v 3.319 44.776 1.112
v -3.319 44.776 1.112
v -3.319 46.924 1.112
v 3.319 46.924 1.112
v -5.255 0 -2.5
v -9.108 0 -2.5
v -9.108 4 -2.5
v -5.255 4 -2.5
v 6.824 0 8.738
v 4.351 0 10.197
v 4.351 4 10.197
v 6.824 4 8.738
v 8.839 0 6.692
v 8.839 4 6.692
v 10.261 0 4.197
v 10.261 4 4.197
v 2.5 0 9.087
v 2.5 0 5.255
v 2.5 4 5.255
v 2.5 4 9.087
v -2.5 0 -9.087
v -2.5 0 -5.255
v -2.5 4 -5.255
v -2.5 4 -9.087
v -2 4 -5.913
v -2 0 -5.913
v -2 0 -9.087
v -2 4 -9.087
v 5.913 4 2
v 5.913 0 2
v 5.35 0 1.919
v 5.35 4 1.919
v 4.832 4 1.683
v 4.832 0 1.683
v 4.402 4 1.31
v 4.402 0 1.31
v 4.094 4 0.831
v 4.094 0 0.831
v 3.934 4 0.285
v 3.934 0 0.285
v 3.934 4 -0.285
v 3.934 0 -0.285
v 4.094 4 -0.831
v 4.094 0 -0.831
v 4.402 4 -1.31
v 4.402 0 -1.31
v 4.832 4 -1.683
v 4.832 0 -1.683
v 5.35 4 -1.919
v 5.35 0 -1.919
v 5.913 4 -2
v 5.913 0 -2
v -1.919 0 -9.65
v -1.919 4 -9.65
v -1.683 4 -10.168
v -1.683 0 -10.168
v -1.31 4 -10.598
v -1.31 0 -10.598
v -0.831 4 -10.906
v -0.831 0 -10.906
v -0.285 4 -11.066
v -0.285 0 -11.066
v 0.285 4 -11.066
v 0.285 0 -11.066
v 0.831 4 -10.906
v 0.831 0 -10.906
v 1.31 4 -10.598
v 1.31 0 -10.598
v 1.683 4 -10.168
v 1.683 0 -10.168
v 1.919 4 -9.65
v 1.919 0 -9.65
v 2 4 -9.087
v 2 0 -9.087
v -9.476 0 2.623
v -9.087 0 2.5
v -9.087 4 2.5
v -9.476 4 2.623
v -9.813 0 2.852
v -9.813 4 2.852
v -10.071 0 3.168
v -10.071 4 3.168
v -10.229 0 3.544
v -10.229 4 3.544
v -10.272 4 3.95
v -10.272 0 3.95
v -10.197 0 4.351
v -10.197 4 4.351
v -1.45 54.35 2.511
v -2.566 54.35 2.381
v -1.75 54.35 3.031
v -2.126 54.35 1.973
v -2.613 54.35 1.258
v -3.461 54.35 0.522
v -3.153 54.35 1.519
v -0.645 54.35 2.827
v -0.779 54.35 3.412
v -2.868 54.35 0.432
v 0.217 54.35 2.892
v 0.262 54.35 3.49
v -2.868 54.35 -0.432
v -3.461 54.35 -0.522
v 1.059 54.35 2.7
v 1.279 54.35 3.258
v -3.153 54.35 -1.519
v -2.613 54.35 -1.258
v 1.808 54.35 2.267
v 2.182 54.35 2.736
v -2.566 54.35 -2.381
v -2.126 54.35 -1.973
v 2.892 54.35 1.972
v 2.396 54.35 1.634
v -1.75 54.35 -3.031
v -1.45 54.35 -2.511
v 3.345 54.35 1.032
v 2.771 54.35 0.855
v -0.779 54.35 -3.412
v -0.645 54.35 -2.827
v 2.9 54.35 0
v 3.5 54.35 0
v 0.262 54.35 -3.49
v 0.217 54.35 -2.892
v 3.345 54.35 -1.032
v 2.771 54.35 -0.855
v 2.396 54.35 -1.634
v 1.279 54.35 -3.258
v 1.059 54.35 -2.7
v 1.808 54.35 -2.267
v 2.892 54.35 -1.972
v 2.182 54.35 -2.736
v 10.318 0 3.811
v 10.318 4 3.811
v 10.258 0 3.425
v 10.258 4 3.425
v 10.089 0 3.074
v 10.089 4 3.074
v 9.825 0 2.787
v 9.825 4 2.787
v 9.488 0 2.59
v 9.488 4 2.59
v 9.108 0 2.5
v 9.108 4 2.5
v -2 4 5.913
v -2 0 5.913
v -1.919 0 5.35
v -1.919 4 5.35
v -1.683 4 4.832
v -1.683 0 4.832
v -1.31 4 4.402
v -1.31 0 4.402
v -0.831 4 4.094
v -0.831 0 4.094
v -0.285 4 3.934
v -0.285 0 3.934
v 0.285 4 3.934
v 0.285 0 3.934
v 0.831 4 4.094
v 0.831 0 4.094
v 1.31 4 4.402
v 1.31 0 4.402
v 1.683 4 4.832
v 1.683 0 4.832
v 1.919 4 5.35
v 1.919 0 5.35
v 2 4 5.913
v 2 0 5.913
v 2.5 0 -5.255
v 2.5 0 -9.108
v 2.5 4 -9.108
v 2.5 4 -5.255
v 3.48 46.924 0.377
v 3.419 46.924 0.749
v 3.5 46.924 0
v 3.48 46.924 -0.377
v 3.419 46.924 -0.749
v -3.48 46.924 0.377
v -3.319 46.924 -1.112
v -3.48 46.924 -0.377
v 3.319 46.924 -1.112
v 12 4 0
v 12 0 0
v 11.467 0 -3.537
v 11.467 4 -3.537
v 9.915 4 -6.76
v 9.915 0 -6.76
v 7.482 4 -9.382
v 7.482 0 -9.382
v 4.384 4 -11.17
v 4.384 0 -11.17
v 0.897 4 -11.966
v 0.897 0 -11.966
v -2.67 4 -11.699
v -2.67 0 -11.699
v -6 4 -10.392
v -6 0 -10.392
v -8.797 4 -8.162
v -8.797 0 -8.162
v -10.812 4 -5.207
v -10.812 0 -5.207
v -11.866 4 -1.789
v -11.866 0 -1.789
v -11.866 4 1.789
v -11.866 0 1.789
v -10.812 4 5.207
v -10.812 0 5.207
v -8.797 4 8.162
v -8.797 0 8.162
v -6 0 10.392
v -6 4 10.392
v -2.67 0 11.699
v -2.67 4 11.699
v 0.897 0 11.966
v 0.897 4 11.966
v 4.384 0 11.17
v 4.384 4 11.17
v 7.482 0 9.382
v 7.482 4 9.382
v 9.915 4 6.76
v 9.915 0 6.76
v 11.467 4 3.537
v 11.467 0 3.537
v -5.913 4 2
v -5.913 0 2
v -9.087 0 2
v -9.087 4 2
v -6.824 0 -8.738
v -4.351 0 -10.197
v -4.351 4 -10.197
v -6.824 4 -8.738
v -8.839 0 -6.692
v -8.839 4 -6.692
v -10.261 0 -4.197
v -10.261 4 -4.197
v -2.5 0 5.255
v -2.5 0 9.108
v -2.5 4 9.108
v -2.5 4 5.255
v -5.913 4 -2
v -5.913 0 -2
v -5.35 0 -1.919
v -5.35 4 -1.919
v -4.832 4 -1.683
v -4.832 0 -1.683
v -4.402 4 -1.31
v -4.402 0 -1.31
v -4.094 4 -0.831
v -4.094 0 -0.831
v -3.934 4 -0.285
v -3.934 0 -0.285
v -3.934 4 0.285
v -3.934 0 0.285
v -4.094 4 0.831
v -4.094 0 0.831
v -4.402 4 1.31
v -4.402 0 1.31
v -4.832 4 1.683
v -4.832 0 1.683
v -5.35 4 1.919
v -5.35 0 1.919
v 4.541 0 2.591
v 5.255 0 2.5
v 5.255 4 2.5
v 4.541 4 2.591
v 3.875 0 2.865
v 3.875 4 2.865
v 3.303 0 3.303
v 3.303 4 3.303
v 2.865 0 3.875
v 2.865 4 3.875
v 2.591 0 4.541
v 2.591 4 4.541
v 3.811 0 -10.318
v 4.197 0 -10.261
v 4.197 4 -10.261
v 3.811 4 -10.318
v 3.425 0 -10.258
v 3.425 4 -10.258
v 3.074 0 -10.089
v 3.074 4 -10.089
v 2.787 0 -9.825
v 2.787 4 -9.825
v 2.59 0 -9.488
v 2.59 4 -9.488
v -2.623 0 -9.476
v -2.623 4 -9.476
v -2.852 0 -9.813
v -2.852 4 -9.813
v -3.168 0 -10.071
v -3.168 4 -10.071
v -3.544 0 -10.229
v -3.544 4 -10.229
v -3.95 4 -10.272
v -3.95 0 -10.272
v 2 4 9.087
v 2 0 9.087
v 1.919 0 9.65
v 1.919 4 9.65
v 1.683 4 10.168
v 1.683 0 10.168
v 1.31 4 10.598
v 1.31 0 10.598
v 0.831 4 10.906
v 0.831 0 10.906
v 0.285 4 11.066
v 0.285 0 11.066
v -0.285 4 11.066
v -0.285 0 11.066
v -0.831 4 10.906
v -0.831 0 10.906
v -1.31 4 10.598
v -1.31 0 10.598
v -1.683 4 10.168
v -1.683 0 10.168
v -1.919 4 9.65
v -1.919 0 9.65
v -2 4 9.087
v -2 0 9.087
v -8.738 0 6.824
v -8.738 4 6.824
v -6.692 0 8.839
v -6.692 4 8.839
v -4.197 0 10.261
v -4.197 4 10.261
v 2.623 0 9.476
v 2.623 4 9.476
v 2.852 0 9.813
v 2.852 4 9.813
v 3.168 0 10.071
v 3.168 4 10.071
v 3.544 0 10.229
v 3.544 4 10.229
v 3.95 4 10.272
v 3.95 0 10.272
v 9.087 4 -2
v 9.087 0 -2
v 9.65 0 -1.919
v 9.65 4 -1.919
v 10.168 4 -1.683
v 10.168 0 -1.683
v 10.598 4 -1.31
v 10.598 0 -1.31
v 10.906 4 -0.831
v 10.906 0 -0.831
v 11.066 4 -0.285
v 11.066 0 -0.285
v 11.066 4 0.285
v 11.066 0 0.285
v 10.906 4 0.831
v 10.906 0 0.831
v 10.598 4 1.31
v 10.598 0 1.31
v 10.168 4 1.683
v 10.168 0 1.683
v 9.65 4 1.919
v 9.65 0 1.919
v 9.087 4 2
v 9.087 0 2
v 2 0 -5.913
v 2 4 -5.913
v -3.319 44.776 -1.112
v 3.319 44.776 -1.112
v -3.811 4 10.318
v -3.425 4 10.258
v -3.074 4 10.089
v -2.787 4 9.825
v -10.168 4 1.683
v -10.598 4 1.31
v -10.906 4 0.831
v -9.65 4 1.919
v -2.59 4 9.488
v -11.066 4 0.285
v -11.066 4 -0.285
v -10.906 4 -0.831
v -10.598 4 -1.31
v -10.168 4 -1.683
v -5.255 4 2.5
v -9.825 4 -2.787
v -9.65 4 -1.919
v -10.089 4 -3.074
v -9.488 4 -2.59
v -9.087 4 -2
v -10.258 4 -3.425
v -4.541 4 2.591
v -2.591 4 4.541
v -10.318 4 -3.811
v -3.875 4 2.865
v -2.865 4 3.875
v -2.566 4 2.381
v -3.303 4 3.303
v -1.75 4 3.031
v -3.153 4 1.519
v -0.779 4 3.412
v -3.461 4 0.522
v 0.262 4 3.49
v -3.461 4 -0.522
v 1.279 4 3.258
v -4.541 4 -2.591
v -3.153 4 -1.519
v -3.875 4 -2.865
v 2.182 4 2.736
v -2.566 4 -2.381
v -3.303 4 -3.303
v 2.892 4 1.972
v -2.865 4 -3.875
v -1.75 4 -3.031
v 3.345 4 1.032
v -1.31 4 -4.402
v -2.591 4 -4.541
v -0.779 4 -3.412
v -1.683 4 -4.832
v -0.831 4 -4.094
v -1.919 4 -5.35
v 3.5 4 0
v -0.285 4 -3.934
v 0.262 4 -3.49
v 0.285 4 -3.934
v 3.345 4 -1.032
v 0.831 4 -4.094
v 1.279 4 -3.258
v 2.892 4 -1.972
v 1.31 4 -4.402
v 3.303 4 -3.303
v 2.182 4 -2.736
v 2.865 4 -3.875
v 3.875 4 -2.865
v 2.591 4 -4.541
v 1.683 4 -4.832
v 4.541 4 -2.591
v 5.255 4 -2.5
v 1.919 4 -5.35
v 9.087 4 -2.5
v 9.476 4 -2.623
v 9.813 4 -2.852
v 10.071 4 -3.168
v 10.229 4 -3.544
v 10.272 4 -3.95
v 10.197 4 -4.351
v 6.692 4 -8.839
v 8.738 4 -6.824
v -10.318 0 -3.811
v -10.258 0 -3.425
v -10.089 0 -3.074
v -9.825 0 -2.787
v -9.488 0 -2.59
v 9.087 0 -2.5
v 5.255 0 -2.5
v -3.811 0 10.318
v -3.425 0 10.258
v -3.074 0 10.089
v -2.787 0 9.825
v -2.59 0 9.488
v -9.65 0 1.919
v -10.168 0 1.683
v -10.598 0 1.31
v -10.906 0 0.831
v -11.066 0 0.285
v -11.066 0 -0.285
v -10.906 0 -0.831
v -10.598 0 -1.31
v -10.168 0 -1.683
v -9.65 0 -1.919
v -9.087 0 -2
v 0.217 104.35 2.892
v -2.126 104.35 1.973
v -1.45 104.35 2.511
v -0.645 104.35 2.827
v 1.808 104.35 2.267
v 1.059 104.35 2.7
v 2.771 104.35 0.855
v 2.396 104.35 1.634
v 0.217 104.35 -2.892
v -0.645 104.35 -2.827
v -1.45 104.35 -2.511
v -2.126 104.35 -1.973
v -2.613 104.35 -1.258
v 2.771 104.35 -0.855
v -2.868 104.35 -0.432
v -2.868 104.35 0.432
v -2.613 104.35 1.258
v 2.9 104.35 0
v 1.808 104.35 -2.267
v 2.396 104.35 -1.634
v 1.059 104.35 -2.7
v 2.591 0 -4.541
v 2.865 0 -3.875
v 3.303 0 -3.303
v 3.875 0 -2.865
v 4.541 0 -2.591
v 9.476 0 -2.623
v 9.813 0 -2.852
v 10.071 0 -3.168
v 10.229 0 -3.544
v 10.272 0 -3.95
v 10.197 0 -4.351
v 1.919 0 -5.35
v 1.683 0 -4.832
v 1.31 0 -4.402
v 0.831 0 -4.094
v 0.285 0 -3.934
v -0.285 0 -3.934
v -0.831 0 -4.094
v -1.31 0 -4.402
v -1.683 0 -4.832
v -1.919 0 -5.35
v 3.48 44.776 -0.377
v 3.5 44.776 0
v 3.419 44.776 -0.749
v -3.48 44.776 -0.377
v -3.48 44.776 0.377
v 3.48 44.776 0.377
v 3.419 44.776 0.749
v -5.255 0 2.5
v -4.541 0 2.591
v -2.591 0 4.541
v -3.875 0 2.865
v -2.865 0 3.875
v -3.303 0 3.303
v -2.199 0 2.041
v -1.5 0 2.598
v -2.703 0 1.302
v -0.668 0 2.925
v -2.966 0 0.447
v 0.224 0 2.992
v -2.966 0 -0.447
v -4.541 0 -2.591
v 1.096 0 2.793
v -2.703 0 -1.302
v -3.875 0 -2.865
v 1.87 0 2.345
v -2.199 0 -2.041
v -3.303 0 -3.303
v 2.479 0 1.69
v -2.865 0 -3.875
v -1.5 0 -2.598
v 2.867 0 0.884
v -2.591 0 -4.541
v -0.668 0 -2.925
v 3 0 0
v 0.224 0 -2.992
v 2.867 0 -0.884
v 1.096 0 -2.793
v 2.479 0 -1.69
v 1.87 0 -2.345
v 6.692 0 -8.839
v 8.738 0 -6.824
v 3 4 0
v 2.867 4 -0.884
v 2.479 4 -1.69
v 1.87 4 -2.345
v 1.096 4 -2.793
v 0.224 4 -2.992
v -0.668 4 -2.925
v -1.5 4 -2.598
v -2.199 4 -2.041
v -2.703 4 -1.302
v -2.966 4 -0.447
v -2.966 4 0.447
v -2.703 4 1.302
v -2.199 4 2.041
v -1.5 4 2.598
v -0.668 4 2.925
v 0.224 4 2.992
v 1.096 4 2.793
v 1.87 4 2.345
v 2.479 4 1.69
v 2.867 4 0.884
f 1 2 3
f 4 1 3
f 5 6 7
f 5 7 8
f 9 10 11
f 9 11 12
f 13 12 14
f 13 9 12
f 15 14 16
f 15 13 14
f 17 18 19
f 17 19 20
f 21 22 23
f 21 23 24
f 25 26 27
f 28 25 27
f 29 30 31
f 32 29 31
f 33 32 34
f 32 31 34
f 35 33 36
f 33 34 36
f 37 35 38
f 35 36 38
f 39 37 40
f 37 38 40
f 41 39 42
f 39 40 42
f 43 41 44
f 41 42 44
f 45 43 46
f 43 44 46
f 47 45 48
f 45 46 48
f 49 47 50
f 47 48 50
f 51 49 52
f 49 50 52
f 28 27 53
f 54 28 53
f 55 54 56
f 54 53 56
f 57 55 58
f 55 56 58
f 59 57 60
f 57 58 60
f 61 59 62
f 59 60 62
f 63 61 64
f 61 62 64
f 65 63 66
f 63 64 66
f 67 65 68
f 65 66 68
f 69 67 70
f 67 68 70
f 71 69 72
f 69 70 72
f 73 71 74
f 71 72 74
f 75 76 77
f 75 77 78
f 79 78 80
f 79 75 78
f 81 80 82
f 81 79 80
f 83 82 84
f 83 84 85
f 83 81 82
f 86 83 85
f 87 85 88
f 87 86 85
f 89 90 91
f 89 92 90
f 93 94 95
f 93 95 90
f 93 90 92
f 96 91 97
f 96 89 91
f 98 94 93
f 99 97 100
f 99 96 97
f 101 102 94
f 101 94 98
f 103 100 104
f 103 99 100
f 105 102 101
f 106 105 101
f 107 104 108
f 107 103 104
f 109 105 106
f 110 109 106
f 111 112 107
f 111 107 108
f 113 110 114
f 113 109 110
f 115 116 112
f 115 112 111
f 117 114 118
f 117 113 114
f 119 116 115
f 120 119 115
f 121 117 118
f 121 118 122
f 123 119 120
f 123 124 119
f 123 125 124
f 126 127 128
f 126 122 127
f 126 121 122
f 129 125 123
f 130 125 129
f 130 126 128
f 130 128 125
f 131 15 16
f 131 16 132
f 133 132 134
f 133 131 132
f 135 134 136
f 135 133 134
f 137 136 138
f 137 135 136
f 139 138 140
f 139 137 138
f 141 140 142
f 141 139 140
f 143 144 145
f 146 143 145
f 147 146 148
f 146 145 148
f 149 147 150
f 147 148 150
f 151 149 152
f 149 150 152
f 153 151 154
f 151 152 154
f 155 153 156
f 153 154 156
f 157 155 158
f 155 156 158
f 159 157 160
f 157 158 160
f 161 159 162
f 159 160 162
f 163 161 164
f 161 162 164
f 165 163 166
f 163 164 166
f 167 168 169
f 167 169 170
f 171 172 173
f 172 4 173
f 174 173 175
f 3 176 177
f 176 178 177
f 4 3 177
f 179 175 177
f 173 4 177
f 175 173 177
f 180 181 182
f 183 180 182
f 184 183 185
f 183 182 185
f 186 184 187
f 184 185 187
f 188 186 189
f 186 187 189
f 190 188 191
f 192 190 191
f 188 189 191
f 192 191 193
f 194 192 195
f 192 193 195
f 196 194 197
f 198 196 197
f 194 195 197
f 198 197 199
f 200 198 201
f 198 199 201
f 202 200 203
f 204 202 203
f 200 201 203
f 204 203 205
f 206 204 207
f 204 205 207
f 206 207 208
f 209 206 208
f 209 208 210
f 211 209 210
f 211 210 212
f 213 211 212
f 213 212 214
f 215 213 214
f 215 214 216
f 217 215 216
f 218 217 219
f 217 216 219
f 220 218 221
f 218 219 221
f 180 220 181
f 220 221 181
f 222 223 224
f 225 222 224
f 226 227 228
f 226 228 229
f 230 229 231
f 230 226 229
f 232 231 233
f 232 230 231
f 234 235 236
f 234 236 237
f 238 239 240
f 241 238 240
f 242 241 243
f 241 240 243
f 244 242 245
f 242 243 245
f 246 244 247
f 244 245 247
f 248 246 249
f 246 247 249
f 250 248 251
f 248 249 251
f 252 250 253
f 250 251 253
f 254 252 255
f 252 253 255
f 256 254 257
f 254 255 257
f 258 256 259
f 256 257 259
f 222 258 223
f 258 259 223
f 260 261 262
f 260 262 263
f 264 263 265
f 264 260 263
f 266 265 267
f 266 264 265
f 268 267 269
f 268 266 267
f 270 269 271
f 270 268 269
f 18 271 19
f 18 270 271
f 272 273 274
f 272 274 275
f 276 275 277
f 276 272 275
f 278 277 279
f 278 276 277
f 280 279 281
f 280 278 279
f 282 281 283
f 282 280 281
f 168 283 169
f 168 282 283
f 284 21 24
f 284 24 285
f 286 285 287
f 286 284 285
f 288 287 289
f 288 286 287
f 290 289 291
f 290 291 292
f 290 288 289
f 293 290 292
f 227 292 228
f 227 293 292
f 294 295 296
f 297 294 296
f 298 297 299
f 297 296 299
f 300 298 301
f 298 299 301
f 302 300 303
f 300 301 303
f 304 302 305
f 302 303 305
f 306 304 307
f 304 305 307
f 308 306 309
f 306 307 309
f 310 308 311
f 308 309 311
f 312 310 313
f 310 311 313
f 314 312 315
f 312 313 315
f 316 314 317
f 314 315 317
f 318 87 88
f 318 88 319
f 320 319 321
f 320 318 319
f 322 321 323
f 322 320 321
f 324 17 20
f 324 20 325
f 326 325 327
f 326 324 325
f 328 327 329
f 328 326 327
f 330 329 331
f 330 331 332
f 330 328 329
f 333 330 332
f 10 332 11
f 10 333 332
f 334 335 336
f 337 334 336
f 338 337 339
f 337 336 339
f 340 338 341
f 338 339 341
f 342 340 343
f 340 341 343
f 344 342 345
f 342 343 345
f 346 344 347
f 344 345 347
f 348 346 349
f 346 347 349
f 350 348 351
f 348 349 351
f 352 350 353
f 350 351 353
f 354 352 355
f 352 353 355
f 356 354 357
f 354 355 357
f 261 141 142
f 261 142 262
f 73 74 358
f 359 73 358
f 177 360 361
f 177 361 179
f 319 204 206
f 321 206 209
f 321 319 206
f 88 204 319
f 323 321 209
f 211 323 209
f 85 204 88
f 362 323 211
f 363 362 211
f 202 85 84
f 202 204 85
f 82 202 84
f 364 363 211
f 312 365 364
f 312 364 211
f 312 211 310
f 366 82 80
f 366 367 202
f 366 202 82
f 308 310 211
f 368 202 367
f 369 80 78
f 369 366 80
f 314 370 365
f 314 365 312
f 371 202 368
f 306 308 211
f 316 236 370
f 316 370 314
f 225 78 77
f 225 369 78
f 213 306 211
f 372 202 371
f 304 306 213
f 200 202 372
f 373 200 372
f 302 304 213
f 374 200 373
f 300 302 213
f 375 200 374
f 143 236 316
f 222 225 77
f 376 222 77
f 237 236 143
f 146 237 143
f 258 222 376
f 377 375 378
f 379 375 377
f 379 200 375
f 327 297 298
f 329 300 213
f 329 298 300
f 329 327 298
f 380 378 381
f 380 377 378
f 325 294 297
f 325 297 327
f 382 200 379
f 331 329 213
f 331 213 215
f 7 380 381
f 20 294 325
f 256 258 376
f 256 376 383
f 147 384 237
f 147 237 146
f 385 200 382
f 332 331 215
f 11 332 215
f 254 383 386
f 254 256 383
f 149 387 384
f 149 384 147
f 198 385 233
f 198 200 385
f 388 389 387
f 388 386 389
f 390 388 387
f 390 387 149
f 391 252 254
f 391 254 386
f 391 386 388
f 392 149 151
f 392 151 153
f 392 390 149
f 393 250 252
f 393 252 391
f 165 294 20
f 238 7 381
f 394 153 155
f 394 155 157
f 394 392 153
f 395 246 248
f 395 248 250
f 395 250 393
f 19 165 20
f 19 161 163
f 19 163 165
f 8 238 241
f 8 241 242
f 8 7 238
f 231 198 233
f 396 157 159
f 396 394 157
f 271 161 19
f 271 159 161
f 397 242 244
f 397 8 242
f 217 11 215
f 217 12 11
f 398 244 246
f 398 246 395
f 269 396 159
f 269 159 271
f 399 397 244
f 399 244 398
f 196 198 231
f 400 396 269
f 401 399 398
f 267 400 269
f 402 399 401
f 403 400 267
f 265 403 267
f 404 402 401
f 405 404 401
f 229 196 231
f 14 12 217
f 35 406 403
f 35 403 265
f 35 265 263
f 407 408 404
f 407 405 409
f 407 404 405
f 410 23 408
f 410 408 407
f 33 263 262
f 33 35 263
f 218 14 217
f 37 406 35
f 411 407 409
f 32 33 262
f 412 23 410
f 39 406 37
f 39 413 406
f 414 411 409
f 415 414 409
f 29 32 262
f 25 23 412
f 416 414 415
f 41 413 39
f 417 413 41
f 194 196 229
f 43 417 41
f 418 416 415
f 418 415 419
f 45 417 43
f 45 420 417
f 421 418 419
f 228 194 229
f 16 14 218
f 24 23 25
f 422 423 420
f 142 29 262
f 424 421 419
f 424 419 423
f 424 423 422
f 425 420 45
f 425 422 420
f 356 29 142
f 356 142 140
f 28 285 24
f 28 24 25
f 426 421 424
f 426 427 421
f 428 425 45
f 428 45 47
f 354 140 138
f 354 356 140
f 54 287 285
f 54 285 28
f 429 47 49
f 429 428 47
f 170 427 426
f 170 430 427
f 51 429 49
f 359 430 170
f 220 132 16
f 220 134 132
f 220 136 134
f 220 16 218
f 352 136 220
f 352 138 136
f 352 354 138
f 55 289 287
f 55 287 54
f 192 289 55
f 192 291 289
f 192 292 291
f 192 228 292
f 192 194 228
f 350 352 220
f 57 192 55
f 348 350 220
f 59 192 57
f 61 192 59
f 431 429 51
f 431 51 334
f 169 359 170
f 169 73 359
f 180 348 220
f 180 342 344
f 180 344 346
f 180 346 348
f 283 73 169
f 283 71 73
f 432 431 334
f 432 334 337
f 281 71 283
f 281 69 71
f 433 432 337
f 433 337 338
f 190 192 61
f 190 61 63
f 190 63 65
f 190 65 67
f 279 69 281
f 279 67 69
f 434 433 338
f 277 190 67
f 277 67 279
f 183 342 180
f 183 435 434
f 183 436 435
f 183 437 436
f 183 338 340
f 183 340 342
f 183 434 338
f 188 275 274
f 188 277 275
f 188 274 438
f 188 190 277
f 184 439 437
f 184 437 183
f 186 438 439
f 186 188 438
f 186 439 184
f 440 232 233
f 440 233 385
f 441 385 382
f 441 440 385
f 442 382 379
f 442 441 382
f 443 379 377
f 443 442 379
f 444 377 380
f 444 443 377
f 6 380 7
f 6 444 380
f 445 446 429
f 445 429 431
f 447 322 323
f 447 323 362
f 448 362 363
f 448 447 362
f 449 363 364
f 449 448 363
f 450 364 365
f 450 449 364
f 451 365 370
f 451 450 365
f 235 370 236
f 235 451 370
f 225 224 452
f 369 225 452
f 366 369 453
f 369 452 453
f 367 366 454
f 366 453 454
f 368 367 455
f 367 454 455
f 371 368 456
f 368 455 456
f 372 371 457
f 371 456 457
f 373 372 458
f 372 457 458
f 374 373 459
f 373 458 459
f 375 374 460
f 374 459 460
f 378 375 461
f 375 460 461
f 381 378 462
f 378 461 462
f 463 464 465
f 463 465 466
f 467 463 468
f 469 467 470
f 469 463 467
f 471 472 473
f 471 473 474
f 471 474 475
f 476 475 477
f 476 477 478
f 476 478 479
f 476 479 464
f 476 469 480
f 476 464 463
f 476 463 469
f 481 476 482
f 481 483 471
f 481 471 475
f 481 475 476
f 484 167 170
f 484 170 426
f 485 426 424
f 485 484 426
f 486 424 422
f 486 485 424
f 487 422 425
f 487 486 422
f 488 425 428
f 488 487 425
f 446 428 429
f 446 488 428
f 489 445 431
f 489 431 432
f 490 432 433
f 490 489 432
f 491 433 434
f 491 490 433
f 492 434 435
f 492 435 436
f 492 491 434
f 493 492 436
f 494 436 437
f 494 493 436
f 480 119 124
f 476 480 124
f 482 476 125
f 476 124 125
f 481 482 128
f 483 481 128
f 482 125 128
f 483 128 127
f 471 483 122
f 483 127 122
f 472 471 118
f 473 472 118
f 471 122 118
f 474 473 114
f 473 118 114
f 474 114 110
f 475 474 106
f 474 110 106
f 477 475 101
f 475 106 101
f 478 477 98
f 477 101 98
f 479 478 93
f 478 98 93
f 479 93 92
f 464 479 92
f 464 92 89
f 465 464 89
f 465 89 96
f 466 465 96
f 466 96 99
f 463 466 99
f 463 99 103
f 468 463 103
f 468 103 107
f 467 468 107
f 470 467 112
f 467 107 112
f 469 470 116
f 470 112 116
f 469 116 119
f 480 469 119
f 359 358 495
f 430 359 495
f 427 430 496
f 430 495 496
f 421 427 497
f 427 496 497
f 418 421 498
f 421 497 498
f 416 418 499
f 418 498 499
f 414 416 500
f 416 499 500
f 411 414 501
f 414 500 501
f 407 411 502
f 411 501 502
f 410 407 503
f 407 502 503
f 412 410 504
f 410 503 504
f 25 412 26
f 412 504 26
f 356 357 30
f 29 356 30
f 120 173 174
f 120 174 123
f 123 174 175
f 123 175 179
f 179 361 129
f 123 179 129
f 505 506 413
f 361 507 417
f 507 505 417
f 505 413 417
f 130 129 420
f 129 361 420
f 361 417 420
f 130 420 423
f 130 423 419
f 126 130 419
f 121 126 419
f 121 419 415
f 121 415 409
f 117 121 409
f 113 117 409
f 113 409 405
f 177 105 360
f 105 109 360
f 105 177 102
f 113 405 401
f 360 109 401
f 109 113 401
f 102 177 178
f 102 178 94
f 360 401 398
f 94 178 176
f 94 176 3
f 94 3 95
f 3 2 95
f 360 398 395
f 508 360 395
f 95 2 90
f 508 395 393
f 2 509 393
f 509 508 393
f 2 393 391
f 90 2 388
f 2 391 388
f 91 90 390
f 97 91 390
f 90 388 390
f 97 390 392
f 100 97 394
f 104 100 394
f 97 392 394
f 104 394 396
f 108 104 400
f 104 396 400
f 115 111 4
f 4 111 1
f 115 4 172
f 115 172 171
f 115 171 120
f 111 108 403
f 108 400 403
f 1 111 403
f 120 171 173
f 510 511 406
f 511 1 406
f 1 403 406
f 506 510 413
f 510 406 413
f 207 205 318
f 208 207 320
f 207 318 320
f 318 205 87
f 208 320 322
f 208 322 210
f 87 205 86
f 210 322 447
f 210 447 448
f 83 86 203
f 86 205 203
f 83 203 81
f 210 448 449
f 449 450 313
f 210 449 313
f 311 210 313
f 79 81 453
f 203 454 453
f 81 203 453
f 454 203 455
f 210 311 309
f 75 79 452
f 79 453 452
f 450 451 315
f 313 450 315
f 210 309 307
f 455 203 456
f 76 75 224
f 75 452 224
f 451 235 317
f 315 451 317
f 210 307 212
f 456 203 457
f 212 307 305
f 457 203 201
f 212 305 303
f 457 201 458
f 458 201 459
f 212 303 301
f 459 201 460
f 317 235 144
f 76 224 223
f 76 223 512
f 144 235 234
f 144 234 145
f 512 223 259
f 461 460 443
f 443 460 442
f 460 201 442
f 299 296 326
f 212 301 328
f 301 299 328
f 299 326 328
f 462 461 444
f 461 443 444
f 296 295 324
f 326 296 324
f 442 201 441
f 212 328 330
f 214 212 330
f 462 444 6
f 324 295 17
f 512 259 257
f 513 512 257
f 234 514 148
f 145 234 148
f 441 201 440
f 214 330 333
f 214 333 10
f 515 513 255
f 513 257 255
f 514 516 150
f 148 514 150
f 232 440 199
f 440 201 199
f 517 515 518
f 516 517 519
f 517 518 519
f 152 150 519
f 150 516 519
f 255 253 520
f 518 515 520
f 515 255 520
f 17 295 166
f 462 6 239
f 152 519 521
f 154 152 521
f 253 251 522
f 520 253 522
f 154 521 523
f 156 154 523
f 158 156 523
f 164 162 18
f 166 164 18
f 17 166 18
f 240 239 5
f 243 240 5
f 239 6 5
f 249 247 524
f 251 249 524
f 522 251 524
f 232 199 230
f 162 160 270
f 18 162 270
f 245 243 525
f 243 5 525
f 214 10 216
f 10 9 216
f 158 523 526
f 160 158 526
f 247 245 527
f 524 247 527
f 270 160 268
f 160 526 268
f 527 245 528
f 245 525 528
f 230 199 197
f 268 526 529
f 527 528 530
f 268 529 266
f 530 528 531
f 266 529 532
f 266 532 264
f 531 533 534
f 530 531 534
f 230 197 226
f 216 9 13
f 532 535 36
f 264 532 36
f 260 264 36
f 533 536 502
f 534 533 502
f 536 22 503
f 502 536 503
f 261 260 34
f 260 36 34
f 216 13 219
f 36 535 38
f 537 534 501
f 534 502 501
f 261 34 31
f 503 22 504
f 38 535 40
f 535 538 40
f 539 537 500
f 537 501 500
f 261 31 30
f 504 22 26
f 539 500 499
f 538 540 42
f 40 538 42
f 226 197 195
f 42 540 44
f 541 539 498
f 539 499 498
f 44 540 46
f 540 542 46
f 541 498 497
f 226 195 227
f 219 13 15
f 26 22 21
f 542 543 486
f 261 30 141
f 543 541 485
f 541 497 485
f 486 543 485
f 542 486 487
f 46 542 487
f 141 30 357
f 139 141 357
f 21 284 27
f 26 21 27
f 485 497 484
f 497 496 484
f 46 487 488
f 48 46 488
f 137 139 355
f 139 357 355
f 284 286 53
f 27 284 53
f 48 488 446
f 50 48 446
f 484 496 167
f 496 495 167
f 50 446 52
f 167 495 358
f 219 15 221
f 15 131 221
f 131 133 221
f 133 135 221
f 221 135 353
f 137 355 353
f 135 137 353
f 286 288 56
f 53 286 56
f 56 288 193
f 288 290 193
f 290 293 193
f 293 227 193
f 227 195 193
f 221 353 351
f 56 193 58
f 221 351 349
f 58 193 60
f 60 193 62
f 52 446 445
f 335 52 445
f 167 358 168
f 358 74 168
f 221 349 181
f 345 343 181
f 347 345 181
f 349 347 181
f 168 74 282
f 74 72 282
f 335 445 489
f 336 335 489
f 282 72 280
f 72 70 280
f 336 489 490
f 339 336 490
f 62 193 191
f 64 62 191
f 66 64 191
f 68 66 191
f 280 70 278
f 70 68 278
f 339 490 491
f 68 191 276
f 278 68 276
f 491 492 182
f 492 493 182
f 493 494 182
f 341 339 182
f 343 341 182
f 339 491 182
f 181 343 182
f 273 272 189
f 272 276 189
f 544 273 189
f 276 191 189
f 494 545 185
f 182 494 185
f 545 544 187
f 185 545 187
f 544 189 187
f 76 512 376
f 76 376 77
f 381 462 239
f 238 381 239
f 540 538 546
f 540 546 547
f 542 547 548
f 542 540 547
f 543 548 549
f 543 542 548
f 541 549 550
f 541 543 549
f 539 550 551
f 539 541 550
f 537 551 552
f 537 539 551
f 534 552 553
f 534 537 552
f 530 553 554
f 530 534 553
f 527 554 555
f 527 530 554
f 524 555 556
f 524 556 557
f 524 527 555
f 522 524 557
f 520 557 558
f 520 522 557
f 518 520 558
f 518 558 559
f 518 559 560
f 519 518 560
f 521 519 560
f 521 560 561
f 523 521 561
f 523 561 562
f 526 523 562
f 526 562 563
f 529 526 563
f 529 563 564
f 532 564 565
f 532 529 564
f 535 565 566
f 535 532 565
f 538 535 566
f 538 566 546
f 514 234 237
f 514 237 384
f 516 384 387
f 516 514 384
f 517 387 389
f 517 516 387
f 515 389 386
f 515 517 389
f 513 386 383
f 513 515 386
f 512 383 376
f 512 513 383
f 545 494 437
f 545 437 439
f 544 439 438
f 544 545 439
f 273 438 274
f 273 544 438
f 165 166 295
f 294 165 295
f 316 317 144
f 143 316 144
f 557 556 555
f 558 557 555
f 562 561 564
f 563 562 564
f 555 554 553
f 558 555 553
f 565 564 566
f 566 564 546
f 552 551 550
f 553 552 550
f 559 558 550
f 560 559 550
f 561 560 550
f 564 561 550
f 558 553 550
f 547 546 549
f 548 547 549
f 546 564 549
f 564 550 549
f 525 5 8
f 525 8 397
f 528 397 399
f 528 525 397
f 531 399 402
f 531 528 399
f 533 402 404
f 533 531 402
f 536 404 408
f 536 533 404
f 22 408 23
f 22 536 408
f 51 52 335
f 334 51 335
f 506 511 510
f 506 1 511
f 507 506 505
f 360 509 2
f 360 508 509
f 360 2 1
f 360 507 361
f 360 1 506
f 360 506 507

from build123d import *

# Parameters (mm, degrees)
SKETCH1_R               = 12
SKETCH1_R_2             = 3
BOSS_EXTRUDE1_DEPTH     = 4
SKETCH2_R               = 3.5
BOSS_EXTRUDE2_DEPTH     = 50.349572071
SKETCH3_W               = 2.224458382
SKETCH3_H               = 2.147670282
CUT_EXTRUDE1_DEPTH      = 4.436572991
CUT_EXTRUDE1_DEPTH_BACK = 100
SKETCH10_R              = 2.9
BOSS_EXTRUDE3_DEPTH     = 50


with BuildPart() as part:
    # Sketch1 → Boss-Extrude1 (new body)
    with BuildSketch(Plane(origin=(0, 0, 0), x_dir=(1, 0, 0), z_dir=(0, 1, 0))):
        Circle(SKETCH1_R)
        Circle(SKETCH1_R_2, mode=Mode.SUBTRACT)
        with BuildLine():
            Line((-2, -9.086626064), (-2, -5.913373936))
            ThreePointArc((-2, -5.913373936), (0, -3.913373936), (2, -5.913373936))
            Line((2, -5.913373936), (2, -9.086626064))
            ThreePointArc((2, -9.086626064), (0, -11.086626064), (-2, -9.086626064))
        make_face(mode=Mode.SUBTRACT)
        with BuildLine():
            Line((-9.086626064, 2), (-5.913373936, 2))
            ThreePointArc((-5.913373936, 2), (-3.913373936, 0), (-5.913373936, -2))
            Line((-5.913373936, -2), (-9.086626064, -2))
            ThreePointArc((-9.086626064, -2), (-11.086626064, 0), (-9.086626064, 2))
        make_face(mode=Mode.SUBTRACT)
        with BuildLine():
            Line((2, 9.086626064), (2, 5.913373936))
            ThreePointArc((2, 5.913373936), (0, 3.913373936), (-2, 5.913373936))
            Line((-2, 5.913373936), (-2, 9.086626064))
            ThreePointArc((-2, 9.086626064), (0, 11.086626064), (2, 9.086626064))
        make_face(mode=Mode.SUBTRACT)
        with BuildLine():
            Line((9.086626064, -2), (5.913373936, -2))
            ThreePointArc((5.913373936, -2), (3.913373936, 0), (5.913373936, 2))
            Line((5.913373936, 2), (9.086626064, 2))
            ThreePointArc((9.086626064, 2), (11.086626064, 0), (9.086626064, -2))
        make_face(mode=Mode.SUBTRACT)
        with BuildLine():
            Line((-5.255365036, -2.5), (-7.5, -2.5))
            Line((-7.5, -2.5), (-9.086626064, -2.5))
            ThreePointArc((-9.086626064, -2.5), (-10.071409475, -3.167974724), (-10.197041871, -4.351277348))
            ThreePointArc((-10.197041871, -4.351277348), (-7.780260231, -7.89815347), (-4.197441442, -10.261323639))
            ThreePointArc((-4.197441442, -10.261323639), (-3.073674879, -10.089196803), (-2.5, -9.107679575))
            Line((-2.5, -9.107679575), (-2.5, -7.5))
            Line((-2.5, -7.5), (-2.5, -5.256429725))
            Line((-2.5, -5.256429725), (-2.5, -5.255365036))
            ThreePointArc((-2.5, -5.255365036), (-3.303104097, -3.303104097), (-5.255365036, -2.5))
        make_face(mode=Mode.SUBTRACT)
        with BuildLine():
            Line((2.5, -5.255365036), (2.5, -7.5))
            Line((2.5, -7.5), (2.5, -9.086626064))
            ThreePointArc((2.5, -9.086626064), (3.167974724, -10.071409475), (4.351277348, -10.197041871))
            ThreePointArc((4.351277348, -10.197041871), (7.89815347, -7.780260231), (10.261323639, -4.197441442))
            ThreePointArc((10.261323639, -4.197441442), (10.089196803, -3.073674879), (9.107679575, -2.5))
            Line((9.107679575, -2.5), (7.5, -2.5))
            Line((7.5, -2.5), (5.256429725, -2.5))
            Line((5.256429725, -2.5), (5.255365036, -2.5))
            ThreePointArc((5.255365036, -2.5), (3.303104097, -3.303104097), (2.5, -5.255365036))
        make_face(mode=Mode.SUBTRACT)
        with BuildLine():
            Line((-2.5, 5.255365036), (-2.5, 7.5))
            Line((-2.5, 7.5), (-2.5, 9.086626064))
            ThreePointArc((-2.5, 9.086626064), (-3.167974724, 10.071409475), (-4.351277348, 10.197041871))
            ThreePointArc((-4.351277348, 10.197041871), (-7.89815347, 7.780260231), (-10.261323639, 4.197441442))
            ThreePointArc((-10.261323639, 4.197441442), (-10.089196803, 3.073674879), (-9.107679575, 2.5))
            Line((-9.107679575, 2.5), (-7.5, 2.5))
            Line((-7.5, 2.5), (-5.256429725, 2.5))
            Line((-5.256429725, 2.5), (-5.255365036, 2.5))
            ThreePointArc((-5.255365036, 2.5), (-3.303104097, 3.303104097), (-2.5, 5.255365036))
        make_face(mode=Mode.SUBTRACT)
        with BuildLine():
            Line((5.255365036, 2.5), (7.5, 2.5))
            Line((7.5, 2.5), (9.086626064, 2.5))
            ThreePointArc((9.086626064, 2.5), (10.071409475, 3.167974724), (10.197041871, 4.351277348))
            ThreePointArc((10.197041871, 4.351277348), (7.780260231, 7.89815347), (4.197441442, 10.261323639))
            ThreePointArc((4.197441442, 10.261323639), (3.073674879, 10.089196803), (2.5, 9.107679575))
            Line((2.5, 9.107679575), (2.5, 7.5))
            Line((2.5, 7.5), (2.5, 5.256429725))
            Line((2.5, 5.256429725), (2.5, 5.255365036))
            ThreePointArc((2.5, 5.255365036), (3.303104097, 3.303104097), (5.255365036, 2.5))
        make_face(mode=Mode.SUBTRACT)
    extrude(amount=BOSS_EXTRUDE1_DEPTH)

    # Sketch2 → Boss-Extrude2 (add)
    with BuildSketch(Plane(origin=(0, 4, 0), x_dir=(1, 0, 0), z_dir=(0, 1, 0))):
        Circle(SKETCH2_R)
    extrude(amount=BOSS_EXTRUDE2_DEPTH)

    # Sketch3 → Cut-Extrude1 (cut, two sides)
    with BuildSketch(Plane(origin=(0, 0, 0), x_dir=(0, 0, -1), z_dir=(1, 0, 0))) as cut_extrude1_sk:
        with Locations((0, 45.849702495)):
            Rectangle(SKETCH3_W, SKETCH3_H)
    extrude(amount=CUT_EXTRUDE1_DEPTH, mode=Mode.SUBTRACT)
    extrude(cut_extrude1_sk.sketch, amount=-CUT_EXTRUDE1_DEPTH_BACK, mode=Mode.SUBTRACT)

    # Sketch10 → Boss-Extrude3 (add)
    with BuildSketch(Plane(origin=(0, 54.349572071, 0), x_dir=(1, 0, 0), z_dir=(0, 1, 0))):
        Circle(SKETCH10_R)
    extrude(amount=BOSS_EXTRUDE3_DEPTH)


solid = part.part
